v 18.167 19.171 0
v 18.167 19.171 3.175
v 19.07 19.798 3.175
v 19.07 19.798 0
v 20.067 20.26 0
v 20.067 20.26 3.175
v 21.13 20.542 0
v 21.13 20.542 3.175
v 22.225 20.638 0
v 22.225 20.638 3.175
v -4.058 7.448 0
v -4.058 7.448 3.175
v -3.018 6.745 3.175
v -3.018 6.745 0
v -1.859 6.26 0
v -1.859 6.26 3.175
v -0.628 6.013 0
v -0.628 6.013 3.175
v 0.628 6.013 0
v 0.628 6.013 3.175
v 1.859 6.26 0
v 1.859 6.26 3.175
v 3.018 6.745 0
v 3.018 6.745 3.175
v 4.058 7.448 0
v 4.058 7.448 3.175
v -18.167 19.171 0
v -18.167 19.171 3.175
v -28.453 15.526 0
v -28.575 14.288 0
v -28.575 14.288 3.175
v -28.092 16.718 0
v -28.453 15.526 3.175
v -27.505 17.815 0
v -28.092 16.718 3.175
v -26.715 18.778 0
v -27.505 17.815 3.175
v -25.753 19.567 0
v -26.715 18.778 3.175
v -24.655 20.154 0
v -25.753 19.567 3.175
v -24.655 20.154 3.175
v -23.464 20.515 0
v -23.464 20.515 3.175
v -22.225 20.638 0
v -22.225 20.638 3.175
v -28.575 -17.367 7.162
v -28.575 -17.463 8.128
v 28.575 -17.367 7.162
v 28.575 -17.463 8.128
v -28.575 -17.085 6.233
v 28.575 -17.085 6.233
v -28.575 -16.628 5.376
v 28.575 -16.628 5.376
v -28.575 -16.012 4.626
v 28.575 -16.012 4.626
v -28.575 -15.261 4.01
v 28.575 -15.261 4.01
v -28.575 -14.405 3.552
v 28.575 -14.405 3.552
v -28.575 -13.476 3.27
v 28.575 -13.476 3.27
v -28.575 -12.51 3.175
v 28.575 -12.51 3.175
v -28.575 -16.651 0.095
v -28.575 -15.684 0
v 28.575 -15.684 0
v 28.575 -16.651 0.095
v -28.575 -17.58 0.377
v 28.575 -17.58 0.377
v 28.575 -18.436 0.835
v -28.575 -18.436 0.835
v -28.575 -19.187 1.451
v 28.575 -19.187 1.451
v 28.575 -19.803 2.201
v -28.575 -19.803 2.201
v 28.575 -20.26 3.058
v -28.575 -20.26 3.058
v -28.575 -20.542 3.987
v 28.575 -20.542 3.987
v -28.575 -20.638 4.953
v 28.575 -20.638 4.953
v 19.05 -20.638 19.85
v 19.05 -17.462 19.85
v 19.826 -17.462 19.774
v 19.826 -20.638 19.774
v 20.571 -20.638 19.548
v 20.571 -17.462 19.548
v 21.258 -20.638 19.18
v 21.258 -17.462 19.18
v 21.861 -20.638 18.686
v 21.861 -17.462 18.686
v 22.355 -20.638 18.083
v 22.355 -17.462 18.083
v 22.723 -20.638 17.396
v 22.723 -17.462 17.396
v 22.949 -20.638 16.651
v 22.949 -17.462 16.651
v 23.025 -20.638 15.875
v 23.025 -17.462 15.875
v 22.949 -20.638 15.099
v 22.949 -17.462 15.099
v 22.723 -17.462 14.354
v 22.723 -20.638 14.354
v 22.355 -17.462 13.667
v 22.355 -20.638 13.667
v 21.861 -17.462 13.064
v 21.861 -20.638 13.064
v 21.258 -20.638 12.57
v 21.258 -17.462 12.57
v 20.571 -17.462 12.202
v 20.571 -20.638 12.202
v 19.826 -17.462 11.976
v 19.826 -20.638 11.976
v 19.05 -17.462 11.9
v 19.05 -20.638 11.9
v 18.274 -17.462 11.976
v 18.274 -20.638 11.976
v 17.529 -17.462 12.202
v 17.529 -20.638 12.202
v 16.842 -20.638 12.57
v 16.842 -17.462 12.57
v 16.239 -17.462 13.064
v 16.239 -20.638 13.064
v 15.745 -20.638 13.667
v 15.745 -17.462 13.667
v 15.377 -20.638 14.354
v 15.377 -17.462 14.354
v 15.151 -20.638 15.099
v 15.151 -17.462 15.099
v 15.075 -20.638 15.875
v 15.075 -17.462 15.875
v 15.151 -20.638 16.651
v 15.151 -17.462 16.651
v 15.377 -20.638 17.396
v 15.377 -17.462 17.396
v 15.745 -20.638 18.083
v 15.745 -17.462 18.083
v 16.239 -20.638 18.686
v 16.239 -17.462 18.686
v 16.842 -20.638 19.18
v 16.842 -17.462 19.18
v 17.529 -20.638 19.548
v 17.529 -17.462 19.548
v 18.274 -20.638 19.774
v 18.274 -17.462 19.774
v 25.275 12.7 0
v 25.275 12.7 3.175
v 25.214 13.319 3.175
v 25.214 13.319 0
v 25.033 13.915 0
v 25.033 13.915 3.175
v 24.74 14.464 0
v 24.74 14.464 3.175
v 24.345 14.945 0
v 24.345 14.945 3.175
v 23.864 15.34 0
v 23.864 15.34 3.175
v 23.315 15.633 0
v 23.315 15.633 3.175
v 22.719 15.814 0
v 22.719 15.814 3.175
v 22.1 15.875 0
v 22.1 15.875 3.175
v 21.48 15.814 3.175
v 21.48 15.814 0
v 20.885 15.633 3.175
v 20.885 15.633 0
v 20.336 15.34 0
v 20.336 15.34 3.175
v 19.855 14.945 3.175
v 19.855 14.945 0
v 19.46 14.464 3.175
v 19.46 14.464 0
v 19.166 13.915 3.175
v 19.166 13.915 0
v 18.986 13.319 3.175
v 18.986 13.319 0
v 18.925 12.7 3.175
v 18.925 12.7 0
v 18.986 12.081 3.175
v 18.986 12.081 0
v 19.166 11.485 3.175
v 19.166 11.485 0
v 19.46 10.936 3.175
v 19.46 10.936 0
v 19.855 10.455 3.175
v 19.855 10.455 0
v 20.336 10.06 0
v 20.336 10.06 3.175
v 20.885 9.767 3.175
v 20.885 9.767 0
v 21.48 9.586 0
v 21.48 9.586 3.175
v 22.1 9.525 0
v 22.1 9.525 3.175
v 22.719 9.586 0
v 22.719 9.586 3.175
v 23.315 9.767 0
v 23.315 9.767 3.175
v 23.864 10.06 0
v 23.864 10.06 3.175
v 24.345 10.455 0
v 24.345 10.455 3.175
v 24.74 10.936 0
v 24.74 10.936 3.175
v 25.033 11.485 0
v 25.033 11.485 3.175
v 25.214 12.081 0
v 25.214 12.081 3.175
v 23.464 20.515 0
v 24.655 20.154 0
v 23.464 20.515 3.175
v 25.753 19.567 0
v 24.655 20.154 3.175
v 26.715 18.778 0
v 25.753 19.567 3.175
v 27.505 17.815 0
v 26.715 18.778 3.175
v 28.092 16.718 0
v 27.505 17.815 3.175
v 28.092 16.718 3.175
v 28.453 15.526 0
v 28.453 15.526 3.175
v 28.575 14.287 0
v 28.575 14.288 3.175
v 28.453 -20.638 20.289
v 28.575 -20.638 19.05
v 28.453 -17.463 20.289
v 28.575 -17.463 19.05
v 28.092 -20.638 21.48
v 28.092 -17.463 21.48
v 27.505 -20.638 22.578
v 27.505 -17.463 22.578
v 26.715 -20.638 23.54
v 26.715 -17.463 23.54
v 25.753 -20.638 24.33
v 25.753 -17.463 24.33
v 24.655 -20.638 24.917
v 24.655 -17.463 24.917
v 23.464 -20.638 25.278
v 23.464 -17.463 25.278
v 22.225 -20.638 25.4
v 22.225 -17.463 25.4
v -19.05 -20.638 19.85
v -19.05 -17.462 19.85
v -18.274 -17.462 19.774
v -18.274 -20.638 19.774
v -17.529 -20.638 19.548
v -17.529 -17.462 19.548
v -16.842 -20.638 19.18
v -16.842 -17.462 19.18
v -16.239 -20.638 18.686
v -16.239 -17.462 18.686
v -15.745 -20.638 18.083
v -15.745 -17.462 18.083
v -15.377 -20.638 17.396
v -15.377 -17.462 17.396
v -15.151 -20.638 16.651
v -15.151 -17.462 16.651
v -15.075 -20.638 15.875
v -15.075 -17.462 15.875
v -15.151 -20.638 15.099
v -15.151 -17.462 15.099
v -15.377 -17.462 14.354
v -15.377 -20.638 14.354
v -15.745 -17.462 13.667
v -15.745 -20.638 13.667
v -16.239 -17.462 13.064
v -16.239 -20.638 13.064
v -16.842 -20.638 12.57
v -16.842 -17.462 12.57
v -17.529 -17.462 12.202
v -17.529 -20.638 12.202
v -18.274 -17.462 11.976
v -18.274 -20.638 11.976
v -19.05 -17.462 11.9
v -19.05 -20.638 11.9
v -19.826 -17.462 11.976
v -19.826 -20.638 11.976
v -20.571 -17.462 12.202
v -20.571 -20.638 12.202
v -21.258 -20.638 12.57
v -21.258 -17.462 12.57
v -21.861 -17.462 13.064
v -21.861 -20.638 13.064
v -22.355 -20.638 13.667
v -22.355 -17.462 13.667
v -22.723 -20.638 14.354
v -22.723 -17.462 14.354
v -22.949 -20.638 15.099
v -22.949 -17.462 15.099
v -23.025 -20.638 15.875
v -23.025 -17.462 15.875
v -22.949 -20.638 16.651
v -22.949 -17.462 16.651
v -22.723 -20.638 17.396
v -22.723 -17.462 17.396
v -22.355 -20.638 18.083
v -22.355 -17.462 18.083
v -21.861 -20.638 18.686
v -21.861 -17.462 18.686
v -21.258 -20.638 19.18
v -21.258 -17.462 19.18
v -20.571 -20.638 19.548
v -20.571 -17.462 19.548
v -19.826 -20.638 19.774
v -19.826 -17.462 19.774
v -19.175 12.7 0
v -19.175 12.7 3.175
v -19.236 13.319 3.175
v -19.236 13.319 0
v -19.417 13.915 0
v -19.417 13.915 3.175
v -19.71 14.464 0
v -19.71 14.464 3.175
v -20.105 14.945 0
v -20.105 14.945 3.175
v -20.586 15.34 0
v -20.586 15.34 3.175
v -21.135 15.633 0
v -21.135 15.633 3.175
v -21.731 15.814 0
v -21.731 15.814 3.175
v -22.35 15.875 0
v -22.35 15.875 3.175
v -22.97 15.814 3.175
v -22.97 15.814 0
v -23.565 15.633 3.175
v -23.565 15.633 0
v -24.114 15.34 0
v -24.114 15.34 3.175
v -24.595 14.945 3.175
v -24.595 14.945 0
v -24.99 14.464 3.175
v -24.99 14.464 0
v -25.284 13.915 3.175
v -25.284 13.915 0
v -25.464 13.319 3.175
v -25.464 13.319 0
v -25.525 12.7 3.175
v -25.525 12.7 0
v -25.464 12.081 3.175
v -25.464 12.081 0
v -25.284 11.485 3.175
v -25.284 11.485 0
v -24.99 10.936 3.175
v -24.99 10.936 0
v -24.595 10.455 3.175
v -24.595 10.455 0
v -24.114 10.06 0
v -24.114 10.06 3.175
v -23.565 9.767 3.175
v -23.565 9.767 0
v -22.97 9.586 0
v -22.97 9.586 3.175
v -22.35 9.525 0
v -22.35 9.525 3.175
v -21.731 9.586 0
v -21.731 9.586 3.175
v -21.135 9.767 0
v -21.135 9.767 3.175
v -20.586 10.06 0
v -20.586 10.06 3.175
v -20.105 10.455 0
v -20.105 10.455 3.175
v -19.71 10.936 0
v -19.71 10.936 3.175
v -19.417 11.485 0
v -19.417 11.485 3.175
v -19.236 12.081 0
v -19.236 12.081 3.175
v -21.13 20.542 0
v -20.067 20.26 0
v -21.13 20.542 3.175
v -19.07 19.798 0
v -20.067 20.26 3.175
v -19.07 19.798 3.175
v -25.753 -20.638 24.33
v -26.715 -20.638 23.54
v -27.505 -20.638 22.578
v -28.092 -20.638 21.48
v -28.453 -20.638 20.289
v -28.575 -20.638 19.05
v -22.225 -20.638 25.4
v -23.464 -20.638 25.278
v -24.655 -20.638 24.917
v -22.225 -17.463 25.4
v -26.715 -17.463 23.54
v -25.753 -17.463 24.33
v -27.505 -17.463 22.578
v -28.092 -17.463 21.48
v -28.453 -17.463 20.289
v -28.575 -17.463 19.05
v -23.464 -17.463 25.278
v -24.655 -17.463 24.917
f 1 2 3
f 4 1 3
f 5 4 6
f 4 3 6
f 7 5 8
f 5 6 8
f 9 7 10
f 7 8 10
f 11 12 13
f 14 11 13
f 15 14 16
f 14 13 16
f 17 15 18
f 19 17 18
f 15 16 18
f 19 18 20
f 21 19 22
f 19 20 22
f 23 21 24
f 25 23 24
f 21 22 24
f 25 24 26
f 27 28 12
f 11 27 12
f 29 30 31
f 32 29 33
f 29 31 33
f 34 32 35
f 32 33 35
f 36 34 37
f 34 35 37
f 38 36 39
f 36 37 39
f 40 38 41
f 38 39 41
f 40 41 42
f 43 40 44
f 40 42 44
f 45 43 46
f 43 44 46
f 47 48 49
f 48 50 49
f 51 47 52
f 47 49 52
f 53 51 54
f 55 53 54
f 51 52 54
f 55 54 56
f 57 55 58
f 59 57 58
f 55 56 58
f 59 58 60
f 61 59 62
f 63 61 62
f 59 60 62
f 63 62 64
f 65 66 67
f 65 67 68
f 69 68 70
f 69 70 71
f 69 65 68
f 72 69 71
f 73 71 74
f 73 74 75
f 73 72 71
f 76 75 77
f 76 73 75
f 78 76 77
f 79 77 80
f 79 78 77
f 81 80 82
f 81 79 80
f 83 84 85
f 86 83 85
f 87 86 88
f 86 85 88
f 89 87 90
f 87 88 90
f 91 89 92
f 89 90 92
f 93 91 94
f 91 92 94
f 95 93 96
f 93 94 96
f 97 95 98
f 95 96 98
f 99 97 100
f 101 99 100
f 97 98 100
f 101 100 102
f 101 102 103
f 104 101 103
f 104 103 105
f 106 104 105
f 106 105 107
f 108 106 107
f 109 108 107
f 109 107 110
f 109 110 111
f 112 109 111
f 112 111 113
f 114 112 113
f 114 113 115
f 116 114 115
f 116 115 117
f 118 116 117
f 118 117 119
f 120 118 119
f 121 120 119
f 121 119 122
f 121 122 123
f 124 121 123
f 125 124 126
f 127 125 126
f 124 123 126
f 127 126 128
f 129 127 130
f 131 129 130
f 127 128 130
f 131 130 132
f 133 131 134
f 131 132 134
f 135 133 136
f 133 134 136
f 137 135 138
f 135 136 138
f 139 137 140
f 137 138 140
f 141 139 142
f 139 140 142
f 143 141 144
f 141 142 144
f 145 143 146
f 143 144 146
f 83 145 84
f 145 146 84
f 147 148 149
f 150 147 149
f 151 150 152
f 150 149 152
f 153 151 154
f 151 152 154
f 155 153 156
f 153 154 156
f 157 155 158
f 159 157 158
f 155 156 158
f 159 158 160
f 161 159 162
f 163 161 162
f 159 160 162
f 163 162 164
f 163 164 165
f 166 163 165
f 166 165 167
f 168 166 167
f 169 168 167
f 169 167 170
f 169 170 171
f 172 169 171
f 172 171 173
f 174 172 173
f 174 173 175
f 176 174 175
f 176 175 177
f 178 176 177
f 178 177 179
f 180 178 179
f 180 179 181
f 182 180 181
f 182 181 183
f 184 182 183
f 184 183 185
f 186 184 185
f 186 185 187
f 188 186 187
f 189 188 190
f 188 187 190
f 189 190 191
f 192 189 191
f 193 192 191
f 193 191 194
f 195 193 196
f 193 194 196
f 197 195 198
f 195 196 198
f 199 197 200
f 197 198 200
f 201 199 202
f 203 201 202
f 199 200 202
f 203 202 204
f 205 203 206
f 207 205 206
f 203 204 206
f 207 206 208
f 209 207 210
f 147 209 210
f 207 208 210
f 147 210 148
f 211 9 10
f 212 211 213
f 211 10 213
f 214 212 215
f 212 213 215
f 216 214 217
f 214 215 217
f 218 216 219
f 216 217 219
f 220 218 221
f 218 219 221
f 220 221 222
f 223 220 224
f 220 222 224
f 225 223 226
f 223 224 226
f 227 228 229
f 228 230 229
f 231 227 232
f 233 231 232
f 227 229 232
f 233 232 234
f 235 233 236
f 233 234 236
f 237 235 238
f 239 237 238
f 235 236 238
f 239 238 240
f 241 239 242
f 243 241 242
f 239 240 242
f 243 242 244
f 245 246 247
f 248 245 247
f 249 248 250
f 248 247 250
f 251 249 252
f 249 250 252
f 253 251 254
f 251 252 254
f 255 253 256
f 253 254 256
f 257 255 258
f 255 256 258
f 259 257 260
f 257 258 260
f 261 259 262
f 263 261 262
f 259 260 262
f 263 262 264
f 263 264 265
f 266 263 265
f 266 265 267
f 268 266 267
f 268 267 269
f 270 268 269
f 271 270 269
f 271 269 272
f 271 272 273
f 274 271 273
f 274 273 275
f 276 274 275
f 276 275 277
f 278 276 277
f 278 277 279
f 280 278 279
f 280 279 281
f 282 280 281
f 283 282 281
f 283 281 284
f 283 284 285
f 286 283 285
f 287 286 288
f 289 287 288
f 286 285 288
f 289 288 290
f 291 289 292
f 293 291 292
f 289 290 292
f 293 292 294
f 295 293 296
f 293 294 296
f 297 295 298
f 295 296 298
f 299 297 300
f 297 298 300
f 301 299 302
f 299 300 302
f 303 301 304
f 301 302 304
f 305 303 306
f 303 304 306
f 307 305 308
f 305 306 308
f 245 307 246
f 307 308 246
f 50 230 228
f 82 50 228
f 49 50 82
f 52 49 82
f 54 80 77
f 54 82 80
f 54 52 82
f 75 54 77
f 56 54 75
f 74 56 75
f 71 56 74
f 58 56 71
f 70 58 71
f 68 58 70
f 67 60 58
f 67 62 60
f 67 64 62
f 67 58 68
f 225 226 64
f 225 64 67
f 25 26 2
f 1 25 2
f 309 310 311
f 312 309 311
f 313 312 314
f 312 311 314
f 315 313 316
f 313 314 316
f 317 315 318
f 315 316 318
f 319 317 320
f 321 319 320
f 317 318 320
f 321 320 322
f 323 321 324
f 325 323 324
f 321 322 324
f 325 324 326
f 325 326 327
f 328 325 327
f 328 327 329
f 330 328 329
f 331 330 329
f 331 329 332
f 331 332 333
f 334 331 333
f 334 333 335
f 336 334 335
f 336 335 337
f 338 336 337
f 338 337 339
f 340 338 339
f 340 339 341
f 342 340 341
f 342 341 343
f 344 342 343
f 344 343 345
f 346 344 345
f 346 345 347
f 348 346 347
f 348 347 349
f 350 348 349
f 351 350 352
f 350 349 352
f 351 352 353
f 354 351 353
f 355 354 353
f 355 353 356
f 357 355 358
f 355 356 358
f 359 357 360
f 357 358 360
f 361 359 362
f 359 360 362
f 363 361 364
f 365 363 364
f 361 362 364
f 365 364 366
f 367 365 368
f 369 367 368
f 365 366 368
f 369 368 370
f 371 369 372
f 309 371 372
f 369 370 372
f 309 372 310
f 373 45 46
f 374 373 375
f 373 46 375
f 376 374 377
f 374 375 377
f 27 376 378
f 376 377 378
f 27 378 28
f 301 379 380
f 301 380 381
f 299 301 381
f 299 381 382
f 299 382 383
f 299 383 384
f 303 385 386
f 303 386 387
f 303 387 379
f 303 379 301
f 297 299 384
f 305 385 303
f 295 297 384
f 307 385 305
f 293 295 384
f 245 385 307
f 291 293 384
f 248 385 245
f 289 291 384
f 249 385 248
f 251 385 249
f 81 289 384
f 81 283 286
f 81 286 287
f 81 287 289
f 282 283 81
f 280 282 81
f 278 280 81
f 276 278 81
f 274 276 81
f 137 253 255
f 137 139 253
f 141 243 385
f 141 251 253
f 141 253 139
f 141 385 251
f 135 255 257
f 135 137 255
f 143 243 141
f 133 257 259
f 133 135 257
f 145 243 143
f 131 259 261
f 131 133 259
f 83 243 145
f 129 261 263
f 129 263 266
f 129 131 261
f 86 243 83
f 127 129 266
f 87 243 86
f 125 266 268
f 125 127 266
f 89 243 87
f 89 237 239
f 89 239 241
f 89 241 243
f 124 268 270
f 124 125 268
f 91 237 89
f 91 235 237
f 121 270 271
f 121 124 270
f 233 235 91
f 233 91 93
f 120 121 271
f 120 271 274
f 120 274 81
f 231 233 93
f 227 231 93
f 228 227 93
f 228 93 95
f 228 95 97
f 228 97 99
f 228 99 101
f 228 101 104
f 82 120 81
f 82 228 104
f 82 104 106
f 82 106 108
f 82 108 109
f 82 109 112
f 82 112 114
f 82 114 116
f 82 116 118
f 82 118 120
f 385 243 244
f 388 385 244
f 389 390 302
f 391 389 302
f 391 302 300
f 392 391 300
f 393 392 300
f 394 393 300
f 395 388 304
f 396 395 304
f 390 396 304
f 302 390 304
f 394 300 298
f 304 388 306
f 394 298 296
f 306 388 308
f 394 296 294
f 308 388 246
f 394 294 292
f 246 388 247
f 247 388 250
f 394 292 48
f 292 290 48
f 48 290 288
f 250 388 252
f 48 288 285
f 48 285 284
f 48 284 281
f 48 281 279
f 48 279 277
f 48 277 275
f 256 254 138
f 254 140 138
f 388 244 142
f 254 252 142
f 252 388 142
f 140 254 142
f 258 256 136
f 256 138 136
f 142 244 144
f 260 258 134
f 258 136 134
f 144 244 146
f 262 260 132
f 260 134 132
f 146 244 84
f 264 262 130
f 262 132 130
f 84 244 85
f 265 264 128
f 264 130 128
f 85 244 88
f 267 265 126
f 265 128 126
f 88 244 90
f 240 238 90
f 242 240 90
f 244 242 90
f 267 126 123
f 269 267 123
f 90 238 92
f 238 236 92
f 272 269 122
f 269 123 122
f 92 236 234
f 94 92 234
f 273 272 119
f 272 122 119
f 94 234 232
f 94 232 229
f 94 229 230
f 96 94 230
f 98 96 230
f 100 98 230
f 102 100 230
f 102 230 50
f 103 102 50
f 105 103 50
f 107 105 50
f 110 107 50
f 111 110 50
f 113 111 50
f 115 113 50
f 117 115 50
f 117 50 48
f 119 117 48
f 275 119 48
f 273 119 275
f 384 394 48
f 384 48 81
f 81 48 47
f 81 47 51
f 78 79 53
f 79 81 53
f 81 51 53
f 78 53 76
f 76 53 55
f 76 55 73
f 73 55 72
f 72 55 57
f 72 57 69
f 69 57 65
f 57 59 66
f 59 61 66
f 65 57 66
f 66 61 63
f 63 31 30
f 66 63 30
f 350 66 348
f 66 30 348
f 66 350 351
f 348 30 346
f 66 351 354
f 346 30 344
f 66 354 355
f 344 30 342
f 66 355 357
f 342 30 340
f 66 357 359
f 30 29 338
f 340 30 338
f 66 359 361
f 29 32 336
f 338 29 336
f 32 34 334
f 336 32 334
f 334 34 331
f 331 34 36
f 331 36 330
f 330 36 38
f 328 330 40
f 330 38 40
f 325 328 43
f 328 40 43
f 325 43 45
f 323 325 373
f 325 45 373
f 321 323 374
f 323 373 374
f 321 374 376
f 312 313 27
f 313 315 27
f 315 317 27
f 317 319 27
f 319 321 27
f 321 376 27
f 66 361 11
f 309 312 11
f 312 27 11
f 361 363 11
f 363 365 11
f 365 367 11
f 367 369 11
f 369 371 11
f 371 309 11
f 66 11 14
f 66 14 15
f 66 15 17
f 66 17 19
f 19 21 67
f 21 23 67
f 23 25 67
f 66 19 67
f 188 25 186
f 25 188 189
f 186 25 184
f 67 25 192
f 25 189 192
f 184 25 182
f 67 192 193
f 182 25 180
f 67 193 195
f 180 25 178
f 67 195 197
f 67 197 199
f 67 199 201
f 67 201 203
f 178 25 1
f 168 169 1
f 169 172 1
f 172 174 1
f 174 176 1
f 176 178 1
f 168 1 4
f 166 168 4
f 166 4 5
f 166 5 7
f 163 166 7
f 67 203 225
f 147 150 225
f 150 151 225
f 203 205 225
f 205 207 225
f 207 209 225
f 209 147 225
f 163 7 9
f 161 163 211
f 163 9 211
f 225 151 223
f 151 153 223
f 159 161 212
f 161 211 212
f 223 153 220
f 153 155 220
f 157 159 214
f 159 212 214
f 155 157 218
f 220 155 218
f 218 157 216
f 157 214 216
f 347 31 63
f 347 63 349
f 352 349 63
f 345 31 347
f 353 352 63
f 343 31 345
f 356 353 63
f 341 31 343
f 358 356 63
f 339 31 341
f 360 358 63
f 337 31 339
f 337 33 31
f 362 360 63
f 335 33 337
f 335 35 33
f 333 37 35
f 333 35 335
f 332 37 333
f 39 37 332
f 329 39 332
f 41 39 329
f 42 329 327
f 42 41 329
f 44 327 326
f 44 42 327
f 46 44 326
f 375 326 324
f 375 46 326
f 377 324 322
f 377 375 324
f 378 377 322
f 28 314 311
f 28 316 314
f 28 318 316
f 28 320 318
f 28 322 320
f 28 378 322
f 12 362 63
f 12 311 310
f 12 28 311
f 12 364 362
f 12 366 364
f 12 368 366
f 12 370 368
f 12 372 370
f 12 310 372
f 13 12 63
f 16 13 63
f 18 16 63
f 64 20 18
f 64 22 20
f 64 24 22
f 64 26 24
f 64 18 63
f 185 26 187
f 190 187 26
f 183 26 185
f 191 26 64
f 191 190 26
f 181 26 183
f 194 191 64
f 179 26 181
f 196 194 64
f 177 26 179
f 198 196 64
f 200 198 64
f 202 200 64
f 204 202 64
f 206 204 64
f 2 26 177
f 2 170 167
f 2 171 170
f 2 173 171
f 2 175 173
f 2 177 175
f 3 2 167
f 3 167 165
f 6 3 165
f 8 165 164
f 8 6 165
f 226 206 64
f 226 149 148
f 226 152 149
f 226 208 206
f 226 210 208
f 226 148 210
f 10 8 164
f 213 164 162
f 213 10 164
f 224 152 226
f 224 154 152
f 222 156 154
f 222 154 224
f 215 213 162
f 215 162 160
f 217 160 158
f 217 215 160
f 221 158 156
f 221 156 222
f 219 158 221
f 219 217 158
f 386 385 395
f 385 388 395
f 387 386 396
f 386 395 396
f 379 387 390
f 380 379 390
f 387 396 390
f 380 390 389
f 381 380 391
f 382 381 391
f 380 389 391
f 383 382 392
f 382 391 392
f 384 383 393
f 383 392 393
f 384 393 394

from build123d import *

# Parameters (mm, degrees)
SKETCH2_W               = 57.15
SKETCH2_H               = 41.275
BOSS_EXTRUDE1_DEPTH     = 3.175
SKETCH7_W               = 25.4
SKETCH7_H               = 3.175
BOSS_EXTRUDE2_DEPTH     = 57.15
CUT_EXTRUDE3_DEPTH      = 66.857337528
CUT_EXTRUDE3_DEPTH_BACK = 57.15
FILLET1_R               = 4.953
FILLET2_R               = 6.35
FILLET3_R               = 6.35
SKETCH13_R              = 3.175
CUT_EXTRUDE5_DEPTH      = 57.15
SKETCH14_R              = 3.9751
CUT_EXTRUDE6_DEPTH      = 57.15
CUT_EXTRUDE8_DEPTH      = 42.669985076


with BuildPart() as part:
    # Sketch2 → Boss-Extrude1 (new body)
    with BuildSketch(Plane.XY):
        Rectangle(SKETCH2_W, SKETCH2_H)
    extrude(amount=BOSS_EXTRUDE1_DEPTH)

    # Sketch7 → Boss-Extrude2 (add)
    with BuildSketch(Plane(origin=(28.575, 0, 0), x_dir=(0, 0, -1), z_dir=(1, 0, 0))):
        with Locations((-12.7, -19.05)):
            Rectangle(SKETCH7_W, SKETCH7_H)
    extrude(amount=-BOSS_EXTRUDE2_DEPTH)

    # Sketch8 → Cut-Extrude3 (cut, two sides: drawn at the far end of the back side and taken through both)
    with BuildSketch(Plane(origin=(28.575, 0, 0), x_dir=(0, 0, -1), z_dir=(1, 0, 0)).offset(-CUT_EXTRUDE3_DEPTH_BACK)):
        with BuildLine():
            Line((0, 86.439447679), (0, -15.6845))
            ThreePointArc((0, -15.6845), (-1.450700113, -19.186799887), (-4.953, -20.6375))
            Line((-4.953, -20.6375), (-107.076947679, -20.6375))
            Line((-107.076947679, -20.6375), (37.348124172, -165.062571851))
            Line((37.348124172, -165.062571851), (144.425071851, -57.985624172))
            Line((144.425071851, -57.985624172), (0, 86.439447679))
        make_face()
    extrude(amount=CUT_EXTRUDE3_DEPTH + CUT_EXTRUDE3_DEPTH_BACK, mode=Mode.SUBTRACT)

    # Fillet1
    fillet1_edges = [part.edges().sort_by_distance(p)[0] for p in [
        (0, -17.4625, 3.175),
    ]]
    fillet(fillet1_edges, radius=FILLET1_R)

    # Fillet2
    fillet2_edges = [part.edges().sort_by_distance(p)[0] for p in [
        (28.575, -19.05, 25.4),
    ]]
    fillet(fillet2_edges, radius=FILLET2_R)

    # Fillet3
    fillet3_edges = [part.edges().sort_by_distance(p)[0] for p in [
        (-28.575, -19.05, 25.4),
    ]]
    fillet(fillet3_edges, radius=FILLET3_R)

    # Sketch13 → Cut-Extrude5 (cut)
    with BuildSketch(Plane.XY.offset(3.175)):
        with Locations((-22.350267212, 12.7)):
            Circle(SKETCH13_R)
        with Locations((22.099732788, 12.7)):
            Circle(SKETCH13_R)
    extrude(amount=-CUT_EXTRUDE5_DEPTH, mode=Mode.SUBTRACT)

    # Sketch14 → Cut-Extrude6 (cut)
    with BuildSketch(Plane(origin=(0, -17.4625, 0), x_dir=(1, 0, 0), z_dir=(0, 1, 0))):
        with Locations(Location((-19.05, -15.875, 0), (0, 0, 270))):
            Circle(SKETCH14_R)
        with Locations(Location((19.05, -15.875, 0), (0, 0, 270))):
            Circle(SKETCH14_R)
    extrude(amount=-CUT_EXTRUDE6_DEPTH, mode=Mode.SUBTRACT)

    # Sketch15 → Cut-Extrude8 (cut, through all)
    with BuildSketch(Plane.XY.offset(3.175)):
        with BuildLine():
            ThreePointArc((-22.225, 20.6375), (-20.067470257, 20.259732866), (-18.166647231, 19.171378869))
            Line((-18.166647231, 19.171378869), (-4.058352769, 7.447821131))
            ThreePointArc((-4.058352769, 7.447821131), (0, 5.9817), (4.058352769, 7.447821131))
            Line((4.058352769, 7.447821131), (18.166647231, 19.171378869))
            ThreePointArc((18.166647231, 19.171378869), (20.067470257, 20.259732866), (22.225, 20.6375))
            Line((22.225, 20.6375), (-22.225, 20.6375))
        make_face()
        with BuildLine():
            ThreePointArc((-28.575, 14.2875), (-26.715128061, 18.777628061), (-22.225, 20.6375))
            Line((-22.225, 20.6375), (-28.575, 20.6375))
            Line((-28.575, 20.6375), (-28.575, 14.2875))
        make_face()
        with BuildLine():
            Line((28.575, 20.6375), (22.225, 20.6375))
            ThreePointArc((22.225, 20.6375), (26.715128061, 18.777628061), (28.575, 14.2875))
            Line((28.575, 14.2875), (28.575, 20.6375))
        make_face()
    extrude(amount=-CUT_EXTRUDE8_DEPTH, mode=Mode.SUBTRACT)


solid = part.part
